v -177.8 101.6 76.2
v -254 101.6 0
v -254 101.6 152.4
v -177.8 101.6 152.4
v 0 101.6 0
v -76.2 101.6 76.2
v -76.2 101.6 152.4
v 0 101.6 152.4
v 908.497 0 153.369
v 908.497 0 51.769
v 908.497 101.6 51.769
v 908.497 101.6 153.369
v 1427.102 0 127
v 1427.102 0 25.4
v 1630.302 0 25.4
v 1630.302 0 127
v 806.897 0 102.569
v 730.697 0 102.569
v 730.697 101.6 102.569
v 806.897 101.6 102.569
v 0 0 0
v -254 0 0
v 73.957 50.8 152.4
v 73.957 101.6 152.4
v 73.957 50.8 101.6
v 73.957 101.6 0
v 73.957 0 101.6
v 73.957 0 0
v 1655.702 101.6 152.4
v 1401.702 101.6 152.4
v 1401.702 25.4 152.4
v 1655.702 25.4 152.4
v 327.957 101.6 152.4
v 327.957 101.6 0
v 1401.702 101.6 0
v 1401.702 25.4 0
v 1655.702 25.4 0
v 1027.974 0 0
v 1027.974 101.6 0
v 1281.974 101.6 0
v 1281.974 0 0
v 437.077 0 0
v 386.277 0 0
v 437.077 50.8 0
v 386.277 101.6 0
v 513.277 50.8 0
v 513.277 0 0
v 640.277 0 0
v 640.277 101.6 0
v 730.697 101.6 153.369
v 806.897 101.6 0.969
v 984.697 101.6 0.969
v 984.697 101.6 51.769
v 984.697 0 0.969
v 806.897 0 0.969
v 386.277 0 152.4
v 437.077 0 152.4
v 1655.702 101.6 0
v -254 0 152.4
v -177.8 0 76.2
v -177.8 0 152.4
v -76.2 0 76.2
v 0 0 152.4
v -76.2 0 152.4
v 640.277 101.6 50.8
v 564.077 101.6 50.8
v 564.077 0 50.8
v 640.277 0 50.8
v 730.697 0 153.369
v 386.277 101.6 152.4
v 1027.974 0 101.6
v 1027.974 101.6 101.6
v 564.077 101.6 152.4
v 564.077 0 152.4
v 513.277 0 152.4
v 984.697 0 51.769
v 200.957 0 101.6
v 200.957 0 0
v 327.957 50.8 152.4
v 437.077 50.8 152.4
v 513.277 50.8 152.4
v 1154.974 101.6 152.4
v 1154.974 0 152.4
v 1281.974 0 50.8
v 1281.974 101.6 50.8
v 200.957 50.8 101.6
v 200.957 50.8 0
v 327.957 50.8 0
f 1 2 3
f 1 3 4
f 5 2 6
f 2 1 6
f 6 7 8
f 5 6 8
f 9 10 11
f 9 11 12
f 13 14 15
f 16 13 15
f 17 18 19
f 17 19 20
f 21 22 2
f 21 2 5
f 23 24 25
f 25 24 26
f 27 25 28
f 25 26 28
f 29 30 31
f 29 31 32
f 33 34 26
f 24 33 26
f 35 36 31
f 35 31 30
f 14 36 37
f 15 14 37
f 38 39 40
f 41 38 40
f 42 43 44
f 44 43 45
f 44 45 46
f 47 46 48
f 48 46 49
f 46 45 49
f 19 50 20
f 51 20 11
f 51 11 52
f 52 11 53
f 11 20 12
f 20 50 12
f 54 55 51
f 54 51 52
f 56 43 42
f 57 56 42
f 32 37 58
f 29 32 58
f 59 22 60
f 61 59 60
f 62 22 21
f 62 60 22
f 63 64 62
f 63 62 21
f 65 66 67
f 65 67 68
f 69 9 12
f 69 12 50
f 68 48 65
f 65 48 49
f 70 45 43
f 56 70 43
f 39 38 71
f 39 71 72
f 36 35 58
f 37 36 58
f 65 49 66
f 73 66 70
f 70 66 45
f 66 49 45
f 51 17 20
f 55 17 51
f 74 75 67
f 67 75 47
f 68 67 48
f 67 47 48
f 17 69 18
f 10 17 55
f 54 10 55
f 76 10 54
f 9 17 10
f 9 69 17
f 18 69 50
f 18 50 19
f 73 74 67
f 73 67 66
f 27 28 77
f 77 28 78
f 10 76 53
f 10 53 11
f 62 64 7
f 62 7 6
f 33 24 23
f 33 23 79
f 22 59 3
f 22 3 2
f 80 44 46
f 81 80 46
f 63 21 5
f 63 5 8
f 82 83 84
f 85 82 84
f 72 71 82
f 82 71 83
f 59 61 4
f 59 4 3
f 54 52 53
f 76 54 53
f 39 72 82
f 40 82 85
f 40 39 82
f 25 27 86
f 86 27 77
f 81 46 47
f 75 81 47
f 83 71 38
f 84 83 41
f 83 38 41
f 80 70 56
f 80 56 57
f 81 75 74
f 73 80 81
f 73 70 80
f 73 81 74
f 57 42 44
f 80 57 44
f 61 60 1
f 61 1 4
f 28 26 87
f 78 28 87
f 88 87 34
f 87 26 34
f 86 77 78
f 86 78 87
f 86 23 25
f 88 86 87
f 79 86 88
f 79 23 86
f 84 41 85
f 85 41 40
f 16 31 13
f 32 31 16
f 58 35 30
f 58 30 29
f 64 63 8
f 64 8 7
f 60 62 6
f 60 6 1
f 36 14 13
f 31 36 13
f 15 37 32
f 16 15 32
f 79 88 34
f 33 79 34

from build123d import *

# Parameters (mm, degrees)
F1_DEPTH  = 101.6
F3_DEPTH  = 152.4
F4_W      = 127
F4_H      = 50.8
F5_DEPTH  = 50.8
F7_DEPTH  = 152.4
F8_W      = 76.2
F8_H      = 101.6
F9_DEPTH  = 101.6
F11_DEPTH = 101.6
F12_W     = 254
F12_H     = 101.6
F13_DEPTH = 152.4
F15_DEPTH = 132.08
F17_DEPTH = 152.4
F18_W     = 254
F18_H     = 101.6
F19_DEPTH = 152.4
F20_SIZE  = 25.4


with BuildPart() as f1:
    # F0 (on Front) → F1 (new body)
    with BuildSketch(Plane.XZ):
        Polygon((-254, 0), (0, 0), (0, 152.4), (-76.2, 152.4), (-76.2, 76.2), (-177.8, 76.2), (-177.8, 152.4), (-254, 152.4), align=None)
    extrude(amount=-F1_DEPTH)


with BuildPart() as f3:
    # F2 (on Top) → F3 (new body)
    with BuildSketch(Plane.XY):
        Polygon((73.956741, 101.6), (73.956741, 0), (200.956741, 0), (200.956741, 50.8), (327.956741, 50.8), (327.956741, 101.6), align=None)
    extrude(amount=F3_DEPTH)

    # F4 (on face) → F5 (cut)
    with BuildSketch(Plane.XZ):
        with Locations((137.456741, 127)):
            Rectangle(F4_W, F4_H)
    extrude(amount=-F5_DEPTH, mode=Mode.SUBTRACT)


with BuildPart() as f7:
    # F6 (on Top) → F7 (new body)
    with BuildSketch(Plane.XY):
        Polygon((386.27745, 101.6), (386.27745, 0), (437.07745, 0), (437.07745, 50.8), (513.27745, 50.8), (513.27745, 0), (640.27745, 0), (640.27745, 101.6), align=None)
    extrude(amount=F7_DEPTH)

    # F8 (on face) → F9 (cut)
    with BuildSketch(Plane.XY.offset(152.4)):
        with Locations((602.17745, 50.8)):
            Rectangle(F8_W, F8_H)
    extrude(amount=-F9_DEPTH, mode=Mode.SUBTRACT)


with BuildPart() as f11:
    # F10 (on Front) → F11 (new body)
    with BuildSketch(Plane.XZ):
        Polygon((806.897046, 102.569079), (806.897046, 0.969079), (984.697046, 0.969079), (984.697046, 51.769079), (908.497046, 51.769079), (908.497046, 153.369079), (730.697046, 153.369079), (730.697046, 102.569079), align=None)
    extrude(amount=-F11_DEPTH)


with BuildPart() as f13:
    # F12 (on Top) → F13 (new body)
    with BuildSketch(Plane.XY):
        with Locations((1154.973732, 50.8)):
            Rectangle(F12_W, F12_H)
    extrude(amount=F13_DEPTH)

    # F14 (on face) → F15 (cut)
    with BuildSketch(Plane.XZ):
        Polygon((1154.973732, 152.4), (1027.973732, 152.4), (1027.973732, 101.6), align=None)
    extrude(amount=-F15_DEPTH, mode=Mode.SUBTRACT)

    # F16 (on face) → F17 (cut)
    with BuildSketch(Plane.XZ):
        Polygon((1154.973732, 152.4), (1281.973732, 50.8), (1281.973732, 152.4), align=None)
    extrude(amount=-F17_DEPTH, mode=Mode.SUBTRACT)


with BuildPart() as f19:
    # F18 (on Top) → F19 (new body)
    with BuildSketch(Plane.XY):
        with Locations((1528.701606, 50.8)):
            Rectangle(F18_W, F18_H)
    extrude(amount=F19_DEPTH)

    # F20
    f20_edges = [f19.edges().sort_by_distance(p)[0] for p in [
        (1401.701606, 0, 76.2),
        (1655.701606, 0, 76.2),
        (1528.701606, 0, 0),
        (1528.701606, 0, 152.4),
    ]]
    chamfer(f20_edges, length=F20_SIZE)


solid = Compound([f1.part, f3.part, f7.part, f11.part, f13.part, f19.part])
